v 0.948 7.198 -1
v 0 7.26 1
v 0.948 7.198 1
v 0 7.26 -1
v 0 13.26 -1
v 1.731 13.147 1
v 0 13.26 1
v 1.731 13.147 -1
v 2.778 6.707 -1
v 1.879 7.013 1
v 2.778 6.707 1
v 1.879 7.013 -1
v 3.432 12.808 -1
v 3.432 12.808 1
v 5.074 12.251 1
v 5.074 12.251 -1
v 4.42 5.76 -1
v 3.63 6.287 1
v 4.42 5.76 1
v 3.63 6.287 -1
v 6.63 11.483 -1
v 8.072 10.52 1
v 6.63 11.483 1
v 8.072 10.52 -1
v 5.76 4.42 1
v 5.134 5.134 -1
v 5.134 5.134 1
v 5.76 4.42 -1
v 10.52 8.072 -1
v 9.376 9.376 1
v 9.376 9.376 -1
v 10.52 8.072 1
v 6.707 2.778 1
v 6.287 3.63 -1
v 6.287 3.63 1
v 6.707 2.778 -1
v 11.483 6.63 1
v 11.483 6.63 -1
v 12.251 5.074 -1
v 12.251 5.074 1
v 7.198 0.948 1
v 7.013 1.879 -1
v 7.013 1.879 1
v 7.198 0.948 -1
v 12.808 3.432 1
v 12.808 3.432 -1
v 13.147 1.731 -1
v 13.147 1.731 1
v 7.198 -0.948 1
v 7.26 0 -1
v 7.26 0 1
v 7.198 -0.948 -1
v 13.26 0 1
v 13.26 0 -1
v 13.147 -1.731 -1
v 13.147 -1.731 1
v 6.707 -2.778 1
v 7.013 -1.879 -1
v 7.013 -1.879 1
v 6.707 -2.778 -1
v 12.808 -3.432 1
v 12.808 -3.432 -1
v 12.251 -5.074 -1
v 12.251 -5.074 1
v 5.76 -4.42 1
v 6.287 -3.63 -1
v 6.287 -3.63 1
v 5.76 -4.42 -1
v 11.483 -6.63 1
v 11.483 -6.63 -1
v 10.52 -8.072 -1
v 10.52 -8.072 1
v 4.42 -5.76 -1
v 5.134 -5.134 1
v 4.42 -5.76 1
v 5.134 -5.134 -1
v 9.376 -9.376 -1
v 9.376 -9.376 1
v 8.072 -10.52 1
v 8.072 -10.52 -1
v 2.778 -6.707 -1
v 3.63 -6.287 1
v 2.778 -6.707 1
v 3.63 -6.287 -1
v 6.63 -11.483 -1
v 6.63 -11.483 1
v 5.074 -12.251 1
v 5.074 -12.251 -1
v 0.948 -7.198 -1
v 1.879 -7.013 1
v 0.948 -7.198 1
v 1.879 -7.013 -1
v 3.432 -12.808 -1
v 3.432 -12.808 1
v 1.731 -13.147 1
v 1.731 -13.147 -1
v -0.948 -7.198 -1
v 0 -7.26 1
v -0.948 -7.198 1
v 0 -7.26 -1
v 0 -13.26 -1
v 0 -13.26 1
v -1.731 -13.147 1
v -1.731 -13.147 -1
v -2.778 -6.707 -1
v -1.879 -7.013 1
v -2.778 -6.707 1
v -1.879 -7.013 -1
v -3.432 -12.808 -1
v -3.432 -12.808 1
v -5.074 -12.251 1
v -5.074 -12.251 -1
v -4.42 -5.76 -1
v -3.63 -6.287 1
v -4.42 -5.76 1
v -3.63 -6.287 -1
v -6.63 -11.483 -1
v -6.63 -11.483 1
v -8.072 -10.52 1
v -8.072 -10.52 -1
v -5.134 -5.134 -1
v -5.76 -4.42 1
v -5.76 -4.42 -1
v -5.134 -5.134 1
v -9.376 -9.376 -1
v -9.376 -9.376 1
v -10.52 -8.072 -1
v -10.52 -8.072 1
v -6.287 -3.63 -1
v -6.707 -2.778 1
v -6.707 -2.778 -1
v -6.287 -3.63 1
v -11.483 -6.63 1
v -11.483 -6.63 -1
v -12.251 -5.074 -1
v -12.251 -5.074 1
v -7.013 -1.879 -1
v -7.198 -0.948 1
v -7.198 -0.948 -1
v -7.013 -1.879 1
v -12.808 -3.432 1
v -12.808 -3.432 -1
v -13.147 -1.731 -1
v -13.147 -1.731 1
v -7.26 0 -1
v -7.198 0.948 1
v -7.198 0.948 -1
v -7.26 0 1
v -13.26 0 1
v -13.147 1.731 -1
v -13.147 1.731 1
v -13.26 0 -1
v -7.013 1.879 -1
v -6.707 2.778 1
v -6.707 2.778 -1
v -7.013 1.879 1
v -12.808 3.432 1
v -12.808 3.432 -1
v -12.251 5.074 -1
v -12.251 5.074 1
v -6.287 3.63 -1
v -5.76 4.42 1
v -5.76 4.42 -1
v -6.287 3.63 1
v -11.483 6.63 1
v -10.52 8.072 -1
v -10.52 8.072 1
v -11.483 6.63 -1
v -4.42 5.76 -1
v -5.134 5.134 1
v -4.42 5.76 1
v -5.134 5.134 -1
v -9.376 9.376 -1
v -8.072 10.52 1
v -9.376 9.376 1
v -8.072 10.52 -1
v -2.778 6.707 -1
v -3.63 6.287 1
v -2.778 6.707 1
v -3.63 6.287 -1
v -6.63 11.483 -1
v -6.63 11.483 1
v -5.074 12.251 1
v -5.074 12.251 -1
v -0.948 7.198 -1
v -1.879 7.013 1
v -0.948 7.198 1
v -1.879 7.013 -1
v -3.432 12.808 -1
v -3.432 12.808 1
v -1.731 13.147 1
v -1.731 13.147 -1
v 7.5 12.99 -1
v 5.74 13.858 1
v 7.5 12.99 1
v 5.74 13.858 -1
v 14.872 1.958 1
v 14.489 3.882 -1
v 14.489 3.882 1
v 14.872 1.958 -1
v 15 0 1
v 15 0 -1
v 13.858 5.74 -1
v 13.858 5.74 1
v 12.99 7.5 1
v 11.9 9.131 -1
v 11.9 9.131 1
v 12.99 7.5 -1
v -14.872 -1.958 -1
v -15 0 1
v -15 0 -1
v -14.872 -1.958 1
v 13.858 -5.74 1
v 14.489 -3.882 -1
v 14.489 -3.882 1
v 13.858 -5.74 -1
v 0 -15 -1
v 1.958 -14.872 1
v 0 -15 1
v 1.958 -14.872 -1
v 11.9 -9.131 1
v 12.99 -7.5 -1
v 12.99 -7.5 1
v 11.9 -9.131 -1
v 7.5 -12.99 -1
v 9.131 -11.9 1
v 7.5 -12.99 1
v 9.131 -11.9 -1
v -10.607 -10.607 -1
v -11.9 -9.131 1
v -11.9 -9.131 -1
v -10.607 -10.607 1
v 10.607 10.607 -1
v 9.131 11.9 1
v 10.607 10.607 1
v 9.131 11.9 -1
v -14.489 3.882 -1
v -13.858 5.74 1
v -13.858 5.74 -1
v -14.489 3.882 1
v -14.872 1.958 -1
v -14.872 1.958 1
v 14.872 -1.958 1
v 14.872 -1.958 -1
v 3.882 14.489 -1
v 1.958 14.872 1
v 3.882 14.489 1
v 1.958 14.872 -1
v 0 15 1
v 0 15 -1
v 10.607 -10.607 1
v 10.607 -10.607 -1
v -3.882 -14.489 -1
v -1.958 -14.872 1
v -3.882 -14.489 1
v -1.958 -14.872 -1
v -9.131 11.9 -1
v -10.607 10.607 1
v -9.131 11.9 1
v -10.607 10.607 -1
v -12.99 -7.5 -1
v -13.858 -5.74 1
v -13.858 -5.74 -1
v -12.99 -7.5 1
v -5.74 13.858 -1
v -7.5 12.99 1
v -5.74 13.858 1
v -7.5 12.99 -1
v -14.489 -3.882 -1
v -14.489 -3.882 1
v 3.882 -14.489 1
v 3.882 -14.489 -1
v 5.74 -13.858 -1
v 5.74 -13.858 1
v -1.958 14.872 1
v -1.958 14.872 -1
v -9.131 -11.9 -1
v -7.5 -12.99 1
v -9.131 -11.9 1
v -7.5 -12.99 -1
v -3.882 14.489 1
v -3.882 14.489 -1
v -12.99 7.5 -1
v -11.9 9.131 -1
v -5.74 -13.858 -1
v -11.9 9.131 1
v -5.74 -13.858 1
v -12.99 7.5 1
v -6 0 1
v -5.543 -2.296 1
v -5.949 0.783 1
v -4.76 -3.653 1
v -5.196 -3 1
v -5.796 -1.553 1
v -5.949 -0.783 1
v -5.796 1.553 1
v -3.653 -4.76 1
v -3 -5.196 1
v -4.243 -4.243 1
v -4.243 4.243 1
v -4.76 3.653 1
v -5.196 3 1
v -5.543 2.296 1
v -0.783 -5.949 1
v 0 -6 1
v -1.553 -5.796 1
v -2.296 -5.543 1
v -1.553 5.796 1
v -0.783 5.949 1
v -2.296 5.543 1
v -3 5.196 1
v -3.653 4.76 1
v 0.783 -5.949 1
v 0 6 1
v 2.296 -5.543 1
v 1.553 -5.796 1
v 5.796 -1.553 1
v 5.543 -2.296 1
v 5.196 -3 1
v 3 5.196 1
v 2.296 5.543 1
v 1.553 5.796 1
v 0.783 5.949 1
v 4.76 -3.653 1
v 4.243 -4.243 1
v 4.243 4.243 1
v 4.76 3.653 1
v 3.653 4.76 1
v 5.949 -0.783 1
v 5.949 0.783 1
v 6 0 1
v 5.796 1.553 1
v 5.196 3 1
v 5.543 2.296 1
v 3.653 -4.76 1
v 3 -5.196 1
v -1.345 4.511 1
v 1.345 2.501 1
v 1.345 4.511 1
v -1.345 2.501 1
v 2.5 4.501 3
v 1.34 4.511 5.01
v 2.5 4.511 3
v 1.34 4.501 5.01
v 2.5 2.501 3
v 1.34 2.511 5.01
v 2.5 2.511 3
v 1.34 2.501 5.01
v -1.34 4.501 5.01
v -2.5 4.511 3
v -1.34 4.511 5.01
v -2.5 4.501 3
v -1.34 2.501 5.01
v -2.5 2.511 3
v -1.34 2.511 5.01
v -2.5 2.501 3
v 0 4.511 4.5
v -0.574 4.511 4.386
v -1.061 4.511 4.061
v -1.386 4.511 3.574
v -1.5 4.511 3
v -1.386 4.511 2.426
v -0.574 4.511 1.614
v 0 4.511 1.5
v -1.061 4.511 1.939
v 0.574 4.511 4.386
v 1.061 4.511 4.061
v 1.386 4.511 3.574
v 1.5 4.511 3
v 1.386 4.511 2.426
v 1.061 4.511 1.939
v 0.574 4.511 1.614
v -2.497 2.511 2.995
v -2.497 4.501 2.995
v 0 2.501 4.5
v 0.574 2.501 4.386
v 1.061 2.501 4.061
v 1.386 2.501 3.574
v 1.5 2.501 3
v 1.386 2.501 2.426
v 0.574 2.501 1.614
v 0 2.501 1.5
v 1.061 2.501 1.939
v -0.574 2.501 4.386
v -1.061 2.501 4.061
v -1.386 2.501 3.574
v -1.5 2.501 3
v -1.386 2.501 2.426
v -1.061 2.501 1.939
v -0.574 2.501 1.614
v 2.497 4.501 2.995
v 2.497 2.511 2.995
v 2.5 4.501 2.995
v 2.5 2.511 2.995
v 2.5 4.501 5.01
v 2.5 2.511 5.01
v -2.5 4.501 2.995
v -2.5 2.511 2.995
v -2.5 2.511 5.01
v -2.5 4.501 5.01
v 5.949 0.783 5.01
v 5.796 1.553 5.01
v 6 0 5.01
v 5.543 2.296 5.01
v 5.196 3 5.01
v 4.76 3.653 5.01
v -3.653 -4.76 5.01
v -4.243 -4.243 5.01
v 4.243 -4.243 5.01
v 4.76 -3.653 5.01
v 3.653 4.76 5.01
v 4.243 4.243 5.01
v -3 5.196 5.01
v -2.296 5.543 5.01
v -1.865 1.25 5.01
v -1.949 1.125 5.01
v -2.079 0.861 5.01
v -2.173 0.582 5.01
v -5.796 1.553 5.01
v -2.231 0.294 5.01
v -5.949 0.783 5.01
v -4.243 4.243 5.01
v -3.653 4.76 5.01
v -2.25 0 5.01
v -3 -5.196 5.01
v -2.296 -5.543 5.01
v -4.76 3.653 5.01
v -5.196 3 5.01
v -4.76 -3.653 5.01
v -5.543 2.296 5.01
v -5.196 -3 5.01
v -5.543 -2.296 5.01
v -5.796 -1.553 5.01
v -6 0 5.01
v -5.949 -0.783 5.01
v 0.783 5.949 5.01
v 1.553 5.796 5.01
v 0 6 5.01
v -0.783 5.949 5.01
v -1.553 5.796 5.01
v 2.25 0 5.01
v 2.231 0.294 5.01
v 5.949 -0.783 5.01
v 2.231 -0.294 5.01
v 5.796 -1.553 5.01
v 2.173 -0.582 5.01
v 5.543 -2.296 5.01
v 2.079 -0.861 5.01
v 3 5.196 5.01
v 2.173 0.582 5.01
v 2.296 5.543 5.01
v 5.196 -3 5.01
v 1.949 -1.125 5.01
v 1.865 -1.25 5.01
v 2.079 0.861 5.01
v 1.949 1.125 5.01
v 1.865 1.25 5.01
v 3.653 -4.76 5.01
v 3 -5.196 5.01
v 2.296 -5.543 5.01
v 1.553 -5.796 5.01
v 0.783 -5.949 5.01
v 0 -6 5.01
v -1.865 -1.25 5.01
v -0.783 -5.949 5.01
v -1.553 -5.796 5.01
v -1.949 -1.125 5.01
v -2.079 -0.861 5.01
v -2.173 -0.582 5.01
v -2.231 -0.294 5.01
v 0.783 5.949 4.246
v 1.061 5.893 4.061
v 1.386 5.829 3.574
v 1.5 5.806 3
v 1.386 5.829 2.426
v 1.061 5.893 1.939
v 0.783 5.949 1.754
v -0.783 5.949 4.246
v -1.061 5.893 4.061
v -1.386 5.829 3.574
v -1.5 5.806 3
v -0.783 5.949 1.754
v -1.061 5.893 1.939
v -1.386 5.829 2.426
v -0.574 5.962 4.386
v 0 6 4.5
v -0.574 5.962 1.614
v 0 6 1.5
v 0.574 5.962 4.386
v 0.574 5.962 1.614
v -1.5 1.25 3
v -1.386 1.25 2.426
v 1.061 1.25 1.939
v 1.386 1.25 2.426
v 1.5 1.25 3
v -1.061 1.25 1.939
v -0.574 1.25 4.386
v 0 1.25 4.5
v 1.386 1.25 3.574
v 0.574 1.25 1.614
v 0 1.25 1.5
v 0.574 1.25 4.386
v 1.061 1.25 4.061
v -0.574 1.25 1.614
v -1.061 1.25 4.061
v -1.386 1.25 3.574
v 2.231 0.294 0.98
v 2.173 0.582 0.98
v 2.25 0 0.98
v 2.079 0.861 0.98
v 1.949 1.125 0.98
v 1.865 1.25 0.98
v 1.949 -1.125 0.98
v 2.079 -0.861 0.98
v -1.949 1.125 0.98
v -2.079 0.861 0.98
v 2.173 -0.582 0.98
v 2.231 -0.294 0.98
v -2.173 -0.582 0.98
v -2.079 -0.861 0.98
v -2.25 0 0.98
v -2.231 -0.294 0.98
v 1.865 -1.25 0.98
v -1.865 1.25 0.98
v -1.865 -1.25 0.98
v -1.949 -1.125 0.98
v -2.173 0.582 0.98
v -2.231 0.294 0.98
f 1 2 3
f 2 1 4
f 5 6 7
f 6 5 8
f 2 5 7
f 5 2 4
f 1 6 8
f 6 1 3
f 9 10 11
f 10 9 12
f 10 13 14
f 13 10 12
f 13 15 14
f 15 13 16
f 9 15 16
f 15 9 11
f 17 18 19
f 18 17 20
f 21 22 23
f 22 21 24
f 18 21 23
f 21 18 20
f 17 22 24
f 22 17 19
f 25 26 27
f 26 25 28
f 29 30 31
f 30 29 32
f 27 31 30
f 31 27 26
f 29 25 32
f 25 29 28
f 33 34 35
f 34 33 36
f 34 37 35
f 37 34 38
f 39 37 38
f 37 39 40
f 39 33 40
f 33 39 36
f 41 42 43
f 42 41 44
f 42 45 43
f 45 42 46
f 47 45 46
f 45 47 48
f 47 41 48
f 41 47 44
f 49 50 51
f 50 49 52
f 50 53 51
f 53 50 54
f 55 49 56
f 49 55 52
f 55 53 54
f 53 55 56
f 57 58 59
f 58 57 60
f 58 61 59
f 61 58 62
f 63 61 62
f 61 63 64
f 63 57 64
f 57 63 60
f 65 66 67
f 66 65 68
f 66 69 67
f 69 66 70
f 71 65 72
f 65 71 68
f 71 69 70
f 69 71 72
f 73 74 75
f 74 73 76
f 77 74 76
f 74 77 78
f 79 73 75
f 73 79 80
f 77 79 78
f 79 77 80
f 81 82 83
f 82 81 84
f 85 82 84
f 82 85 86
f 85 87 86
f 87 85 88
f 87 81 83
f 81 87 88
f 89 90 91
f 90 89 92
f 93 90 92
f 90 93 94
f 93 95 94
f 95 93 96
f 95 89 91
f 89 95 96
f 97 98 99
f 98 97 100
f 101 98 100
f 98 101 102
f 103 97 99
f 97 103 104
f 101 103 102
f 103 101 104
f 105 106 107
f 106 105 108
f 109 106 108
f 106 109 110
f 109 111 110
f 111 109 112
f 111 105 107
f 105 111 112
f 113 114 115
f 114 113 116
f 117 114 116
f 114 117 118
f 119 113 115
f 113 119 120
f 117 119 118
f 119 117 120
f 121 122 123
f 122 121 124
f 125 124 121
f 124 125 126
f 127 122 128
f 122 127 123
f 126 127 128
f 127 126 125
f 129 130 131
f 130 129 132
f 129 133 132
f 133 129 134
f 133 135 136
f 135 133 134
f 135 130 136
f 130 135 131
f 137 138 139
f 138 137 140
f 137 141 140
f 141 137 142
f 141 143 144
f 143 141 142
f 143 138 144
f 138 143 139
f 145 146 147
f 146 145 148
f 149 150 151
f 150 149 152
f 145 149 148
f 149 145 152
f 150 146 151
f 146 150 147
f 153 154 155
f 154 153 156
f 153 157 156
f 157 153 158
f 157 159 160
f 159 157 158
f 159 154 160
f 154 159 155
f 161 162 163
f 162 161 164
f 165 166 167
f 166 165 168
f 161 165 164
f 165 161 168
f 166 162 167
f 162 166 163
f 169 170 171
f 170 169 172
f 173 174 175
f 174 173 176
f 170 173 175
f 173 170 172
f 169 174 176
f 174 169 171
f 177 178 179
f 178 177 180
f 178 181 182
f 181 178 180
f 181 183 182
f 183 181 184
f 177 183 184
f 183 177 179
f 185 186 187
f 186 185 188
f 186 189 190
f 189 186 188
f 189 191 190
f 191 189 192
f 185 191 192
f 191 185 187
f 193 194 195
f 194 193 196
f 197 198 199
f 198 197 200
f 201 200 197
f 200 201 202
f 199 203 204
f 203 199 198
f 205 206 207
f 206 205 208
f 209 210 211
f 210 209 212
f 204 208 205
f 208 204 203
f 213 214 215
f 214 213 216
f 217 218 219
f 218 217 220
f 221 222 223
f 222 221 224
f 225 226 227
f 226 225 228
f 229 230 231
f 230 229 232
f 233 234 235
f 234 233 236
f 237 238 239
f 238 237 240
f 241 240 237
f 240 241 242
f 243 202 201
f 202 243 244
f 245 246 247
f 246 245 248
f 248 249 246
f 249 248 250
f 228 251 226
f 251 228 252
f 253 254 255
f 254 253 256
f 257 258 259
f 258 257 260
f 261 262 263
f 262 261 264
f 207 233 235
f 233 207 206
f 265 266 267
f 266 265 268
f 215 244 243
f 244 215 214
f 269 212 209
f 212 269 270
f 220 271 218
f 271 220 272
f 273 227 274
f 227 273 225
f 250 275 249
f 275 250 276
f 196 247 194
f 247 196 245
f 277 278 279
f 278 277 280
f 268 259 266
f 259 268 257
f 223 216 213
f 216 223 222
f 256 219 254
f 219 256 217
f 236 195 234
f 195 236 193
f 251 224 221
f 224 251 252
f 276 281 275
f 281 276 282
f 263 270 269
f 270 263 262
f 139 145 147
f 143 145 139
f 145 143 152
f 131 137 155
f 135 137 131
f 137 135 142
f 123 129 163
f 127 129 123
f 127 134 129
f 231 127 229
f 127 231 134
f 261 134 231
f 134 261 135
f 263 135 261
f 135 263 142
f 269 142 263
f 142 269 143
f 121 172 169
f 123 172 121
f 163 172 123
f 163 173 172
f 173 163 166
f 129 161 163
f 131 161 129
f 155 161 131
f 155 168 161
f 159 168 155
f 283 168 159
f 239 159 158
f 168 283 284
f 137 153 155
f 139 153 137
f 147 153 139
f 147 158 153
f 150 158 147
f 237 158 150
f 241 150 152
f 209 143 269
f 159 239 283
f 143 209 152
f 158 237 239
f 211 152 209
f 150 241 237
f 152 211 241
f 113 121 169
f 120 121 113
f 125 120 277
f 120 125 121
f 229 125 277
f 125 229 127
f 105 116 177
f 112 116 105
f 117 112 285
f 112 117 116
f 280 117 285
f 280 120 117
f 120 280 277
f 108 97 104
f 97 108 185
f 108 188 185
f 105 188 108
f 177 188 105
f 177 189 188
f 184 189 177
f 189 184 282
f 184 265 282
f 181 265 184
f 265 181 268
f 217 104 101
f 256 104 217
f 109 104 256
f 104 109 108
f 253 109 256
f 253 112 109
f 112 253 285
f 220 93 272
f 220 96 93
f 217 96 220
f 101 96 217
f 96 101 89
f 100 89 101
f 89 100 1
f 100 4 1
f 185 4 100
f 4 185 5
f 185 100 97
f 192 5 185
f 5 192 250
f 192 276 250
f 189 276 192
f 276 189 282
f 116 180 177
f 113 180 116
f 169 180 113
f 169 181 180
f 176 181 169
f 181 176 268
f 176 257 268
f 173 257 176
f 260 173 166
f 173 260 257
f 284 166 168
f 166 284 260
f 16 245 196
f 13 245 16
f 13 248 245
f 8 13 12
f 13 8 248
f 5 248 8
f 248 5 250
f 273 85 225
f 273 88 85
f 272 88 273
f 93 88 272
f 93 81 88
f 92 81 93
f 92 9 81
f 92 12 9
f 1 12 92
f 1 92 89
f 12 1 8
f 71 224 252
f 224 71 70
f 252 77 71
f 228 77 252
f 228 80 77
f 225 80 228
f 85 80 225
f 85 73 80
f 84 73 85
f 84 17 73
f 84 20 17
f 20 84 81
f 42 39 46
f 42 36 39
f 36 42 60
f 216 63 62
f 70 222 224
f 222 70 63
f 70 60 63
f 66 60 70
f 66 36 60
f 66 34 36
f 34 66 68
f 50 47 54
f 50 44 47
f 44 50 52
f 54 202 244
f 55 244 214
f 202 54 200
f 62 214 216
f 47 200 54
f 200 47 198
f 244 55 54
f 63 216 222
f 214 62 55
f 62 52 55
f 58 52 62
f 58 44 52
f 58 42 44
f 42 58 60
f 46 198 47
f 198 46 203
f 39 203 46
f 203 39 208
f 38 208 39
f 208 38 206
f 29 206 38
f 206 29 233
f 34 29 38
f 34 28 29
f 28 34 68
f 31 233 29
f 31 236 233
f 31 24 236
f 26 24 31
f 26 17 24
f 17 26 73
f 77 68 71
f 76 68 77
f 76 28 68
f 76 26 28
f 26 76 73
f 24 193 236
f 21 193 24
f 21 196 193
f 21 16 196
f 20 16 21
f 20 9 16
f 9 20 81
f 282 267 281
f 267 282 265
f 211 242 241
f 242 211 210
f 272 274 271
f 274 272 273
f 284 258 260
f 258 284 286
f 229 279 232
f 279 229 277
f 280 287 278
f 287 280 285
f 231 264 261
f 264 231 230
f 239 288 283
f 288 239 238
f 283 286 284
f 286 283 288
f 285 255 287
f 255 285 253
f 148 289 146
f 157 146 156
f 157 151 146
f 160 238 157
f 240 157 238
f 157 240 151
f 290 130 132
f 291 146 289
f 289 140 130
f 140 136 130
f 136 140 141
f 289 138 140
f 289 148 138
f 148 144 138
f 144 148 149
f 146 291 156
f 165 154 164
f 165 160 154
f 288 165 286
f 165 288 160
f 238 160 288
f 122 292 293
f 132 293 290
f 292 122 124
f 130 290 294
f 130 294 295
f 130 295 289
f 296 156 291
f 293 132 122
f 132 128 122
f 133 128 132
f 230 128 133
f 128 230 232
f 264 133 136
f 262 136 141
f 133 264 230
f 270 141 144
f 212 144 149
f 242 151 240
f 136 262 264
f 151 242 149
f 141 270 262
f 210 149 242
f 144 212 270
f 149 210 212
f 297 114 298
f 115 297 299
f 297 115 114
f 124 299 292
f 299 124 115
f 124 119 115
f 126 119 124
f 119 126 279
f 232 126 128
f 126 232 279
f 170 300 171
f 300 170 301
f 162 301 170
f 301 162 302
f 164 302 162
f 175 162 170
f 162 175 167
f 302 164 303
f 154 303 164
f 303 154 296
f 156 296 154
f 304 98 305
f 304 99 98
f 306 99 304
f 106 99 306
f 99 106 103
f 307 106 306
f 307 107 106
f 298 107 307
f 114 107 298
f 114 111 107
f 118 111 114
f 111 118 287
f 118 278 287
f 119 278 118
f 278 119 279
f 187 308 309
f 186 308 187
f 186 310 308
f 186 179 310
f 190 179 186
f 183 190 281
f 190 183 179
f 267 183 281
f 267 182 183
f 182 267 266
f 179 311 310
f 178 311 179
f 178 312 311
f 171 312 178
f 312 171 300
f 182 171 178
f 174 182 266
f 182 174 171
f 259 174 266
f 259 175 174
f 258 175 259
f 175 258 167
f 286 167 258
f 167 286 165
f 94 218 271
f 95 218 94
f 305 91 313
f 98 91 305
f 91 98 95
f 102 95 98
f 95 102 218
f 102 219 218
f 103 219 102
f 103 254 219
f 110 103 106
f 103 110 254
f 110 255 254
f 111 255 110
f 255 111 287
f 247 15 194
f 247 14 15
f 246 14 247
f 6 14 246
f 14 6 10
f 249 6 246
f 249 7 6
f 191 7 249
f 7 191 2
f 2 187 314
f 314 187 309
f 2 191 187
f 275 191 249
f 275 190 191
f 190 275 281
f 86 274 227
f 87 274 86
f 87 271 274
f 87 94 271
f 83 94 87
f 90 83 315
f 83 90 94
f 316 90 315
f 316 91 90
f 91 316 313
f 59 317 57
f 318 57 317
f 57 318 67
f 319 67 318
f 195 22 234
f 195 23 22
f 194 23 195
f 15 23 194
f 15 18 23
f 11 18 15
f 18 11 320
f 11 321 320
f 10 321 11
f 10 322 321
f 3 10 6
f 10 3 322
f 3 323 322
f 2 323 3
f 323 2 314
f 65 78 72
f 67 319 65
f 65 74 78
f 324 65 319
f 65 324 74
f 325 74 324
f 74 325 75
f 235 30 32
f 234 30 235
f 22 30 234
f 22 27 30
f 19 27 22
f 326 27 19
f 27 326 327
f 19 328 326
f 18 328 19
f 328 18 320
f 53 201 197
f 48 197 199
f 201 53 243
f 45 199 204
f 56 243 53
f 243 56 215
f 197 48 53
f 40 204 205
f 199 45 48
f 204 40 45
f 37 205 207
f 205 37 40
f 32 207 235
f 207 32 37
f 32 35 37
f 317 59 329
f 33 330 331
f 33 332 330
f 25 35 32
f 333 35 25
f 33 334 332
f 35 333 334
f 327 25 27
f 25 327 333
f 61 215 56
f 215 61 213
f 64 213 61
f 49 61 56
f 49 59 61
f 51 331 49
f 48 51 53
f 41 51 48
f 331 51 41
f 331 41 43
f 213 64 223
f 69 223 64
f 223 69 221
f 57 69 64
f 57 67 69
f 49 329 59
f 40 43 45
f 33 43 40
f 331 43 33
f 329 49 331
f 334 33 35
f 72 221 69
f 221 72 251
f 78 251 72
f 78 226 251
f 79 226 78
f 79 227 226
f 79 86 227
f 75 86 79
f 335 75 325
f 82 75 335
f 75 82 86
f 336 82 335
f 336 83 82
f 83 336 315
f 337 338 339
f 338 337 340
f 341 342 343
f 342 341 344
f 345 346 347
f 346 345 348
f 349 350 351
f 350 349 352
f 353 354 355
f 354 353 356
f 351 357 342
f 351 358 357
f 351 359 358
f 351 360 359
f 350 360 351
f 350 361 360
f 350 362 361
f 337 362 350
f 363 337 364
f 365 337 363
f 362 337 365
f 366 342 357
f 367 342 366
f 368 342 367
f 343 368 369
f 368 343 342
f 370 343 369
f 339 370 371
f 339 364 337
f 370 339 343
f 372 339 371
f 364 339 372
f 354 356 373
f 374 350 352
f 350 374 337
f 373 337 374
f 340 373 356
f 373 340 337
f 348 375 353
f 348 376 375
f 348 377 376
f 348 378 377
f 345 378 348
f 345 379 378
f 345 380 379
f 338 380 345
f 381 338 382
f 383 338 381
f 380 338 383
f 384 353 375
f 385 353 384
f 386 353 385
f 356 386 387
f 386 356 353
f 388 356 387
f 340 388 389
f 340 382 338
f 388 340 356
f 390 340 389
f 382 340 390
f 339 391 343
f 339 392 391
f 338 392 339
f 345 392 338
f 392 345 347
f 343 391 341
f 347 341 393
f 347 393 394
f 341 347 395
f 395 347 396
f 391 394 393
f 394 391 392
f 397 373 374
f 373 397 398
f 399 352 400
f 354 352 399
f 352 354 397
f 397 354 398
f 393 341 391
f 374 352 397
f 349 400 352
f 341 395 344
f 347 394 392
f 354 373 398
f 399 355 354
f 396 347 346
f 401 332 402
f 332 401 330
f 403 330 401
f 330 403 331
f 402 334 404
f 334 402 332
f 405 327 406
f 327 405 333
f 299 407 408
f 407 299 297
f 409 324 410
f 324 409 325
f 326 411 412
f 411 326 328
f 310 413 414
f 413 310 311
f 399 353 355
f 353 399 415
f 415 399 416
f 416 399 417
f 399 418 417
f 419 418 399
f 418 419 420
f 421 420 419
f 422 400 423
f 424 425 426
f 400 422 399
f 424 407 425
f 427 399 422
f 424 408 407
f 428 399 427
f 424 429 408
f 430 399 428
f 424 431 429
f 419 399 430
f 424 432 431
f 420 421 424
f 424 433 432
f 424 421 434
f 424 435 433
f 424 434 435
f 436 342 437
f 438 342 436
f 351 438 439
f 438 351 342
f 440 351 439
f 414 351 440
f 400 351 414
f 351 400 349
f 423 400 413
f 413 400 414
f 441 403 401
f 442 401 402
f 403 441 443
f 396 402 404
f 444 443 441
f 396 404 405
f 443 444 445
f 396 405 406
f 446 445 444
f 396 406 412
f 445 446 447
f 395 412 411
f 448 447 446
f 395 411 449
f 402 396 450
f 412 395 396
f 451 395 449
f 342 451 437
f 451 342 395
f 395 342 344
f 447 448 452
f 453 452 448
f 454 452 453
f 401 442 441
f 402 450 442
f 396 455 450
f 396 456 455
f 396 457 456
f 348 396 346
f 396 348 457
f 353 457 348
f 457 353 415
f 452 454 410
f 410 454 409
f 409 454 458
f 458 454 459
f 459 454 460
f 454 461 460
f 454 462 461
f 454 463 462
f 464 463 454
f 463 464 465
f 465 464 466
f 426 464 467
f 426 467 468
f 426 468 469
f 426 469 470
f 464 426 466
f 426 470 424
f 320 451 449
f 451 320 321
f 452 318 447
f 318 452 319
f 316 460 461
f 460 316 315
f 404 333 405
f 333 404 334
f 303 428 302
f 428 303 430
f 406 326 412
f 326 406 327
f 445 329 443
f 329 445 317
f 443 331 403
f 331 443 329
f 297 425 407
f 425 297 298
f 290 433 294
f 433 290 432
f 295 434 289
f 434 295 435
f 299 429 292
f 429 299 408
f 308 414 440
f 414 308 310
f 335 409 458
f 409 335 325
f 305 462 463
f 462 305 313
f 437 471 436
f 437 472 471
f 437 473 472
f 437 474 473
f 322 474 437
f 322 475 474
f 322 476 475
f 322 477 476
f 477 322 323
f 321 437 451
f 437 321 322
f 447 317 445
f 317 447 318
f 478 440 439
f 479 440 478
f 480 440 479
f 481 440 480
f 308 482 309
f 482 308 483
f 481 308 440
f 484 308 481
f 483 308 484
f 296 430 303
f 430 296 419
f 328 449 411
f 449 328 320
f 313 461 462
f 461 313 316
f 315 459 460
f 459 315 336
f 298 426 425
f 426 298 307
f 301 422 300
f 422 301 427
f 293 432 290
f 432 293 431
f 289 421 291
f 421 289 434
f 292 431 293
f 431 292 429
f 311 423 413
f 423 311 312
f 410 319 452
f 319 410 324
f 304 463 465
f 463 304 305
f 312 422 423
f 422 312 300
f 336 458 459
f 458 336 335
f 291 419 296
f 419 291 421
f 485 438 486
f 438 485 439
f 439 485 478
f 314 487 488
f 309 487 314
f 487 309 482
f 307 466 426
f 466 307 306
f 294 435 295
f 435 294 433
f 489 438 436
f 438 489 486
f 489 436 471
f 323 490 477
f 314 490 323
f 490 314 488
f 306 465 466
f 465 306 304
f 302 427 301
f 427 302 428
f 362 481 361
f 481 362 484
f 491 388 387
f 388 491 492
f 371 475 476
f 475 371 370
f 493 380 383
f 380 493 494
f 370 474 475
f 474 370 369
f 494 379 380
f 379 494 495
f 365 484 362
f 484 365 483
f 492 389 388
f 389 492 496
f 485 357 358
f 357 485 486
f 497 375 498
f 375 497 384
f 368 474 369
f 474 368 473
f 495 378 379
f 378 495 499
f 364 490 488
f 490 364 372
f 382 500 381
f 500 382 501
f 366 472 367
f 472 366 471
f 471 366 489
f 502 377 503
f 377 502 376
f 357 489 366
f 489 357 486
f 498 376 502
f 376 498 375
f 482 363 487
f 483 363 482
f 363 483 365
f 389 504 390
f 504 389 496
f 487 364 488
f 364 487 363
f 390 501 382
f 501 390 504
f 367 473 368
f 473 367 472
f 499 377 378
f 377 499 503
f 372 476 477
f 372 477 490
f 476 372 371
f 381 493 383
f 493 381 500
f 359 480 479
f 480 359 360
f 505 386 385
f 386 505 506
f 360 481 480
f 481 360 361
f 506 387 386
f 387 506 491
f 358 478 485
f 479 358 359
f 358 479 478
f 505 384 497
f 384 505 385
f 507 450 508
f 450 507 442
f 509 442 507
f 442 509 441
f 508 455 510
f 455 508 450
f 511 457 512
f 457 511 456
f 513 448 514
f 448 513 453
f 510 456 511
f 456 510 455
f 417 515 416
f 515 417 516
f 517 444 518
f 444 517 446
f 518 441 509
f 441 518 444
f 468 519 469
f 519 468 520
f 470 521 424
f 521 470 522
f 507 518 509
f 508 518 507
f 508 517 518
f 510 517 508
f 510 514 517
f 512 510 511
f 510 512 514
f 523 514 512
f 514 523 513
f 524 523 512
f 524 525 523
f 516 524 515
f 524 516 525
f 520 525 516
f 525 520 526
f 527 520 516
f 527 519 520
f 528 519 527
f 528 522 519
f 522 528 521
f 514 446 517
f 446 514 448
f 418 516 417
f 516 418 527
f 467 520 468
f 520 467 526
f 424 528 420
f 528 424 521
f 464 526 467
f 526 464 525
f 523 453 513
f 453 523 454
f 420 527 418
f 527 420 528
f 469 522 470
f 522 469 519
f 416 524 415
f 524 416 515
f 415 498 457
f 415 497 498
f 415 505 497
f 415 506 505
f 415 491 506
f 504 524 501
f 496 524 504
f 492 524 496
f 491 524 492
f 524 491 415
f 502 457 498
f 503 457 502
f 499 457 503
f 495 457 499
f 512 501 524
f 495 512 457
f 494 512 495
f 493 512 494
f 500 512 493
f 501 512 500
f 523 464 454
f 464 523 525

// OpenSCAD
//customizable optical encoder
// James Wickware - 7/18/2016

// preview[view:north east, tilt:top diagonal]

/* [Encoder] */
// the outer diameter of the optical encoder in millimeters.
outer_diameter = 30; //[0:150] 

// the height of the encoder wheel in millimeters.
wheel_height = 2; //[0.1:0.1:20]

// the length of the slits in millimeters.
slit_length = 6; //[0:0.5:75]

// the number of slits in the encoder.
slit_count = 24; // [2:100]

// the ratio of the slit opening to the solid section between the slits. (0.5 is equal )
slit_ratio = 0.5; // [0.05:0.05:0.95]

// the distance between the outer diameter and the opening of the slits in millimeters.
rim_width =  1.75; // [0:0.25:25]



/* [Hub] */
// the diameter of the inner hub in millimeters.
hub_diameter = 12; // [0:0.25:25]

// the length that the hub shaft extends from the encoder wheel in millimeters.
hub_height = 4; // [0:0.5:50]


/* [Shaft] */
// the type of shaft 0 for circular shaft, 1 d shaft (circular with 1 flat, 2 double d shaft (circular with 2 flats), 3 for square shaft 4 for hex shaft, 5 for octagonal shaft.
shaft_type =2; //[0:Cylindrical Shaft, 1:D Type Shaft,2:Double D type Shaft,3:Square Shaft, 4:Hexagonal Shaft, 5:Octagonal Shaft]

// the diameter of the hole for the shaft in millimeters.
shaft_diameter = 4.5; //[0:0.1:20]

// Choose whether or not you want the shaft to go all the way through the encoder wheel.
shaft_goes_through_encoder =0 ; // [0:False,1:True]

// the depth of the flat from the outside edge of the shaft in millimeters (for d and double d shaft type only).
shaft_flat_depth = 1; // [0:0.1:10]


/* [Set Screw] */
// choose whether to include a hole for a set screw
set_screw = 1; // [0:False,1:True]

// the size of the set screw in millimeters
set_screw_diameter = 3; // [0:0.5:10]

// choose whether to include a slot for a set screw nut (automatically disabled when there is not enough room for it).
set_screw_nut = 1; // [0:False,1:True]

// the set screw nut diameter in millimeters. (for hex nuts, the distance from one corner to the opposite corner)
set_screw_nut_diameter = 5; // [1:0.25:14]
 
//  the set screw nut thickness in millimeters
set_screw_nut_thickness = 2; //[0.25:0.25:10]

/* [Hidden] */

// the outer radius
outer_radius = max(outer_diameter/2, hub_diameter/2);

// the hub radius.
hub_radius = hub_diameter/2;
shaft_radius = shaft_diameter/2;

// the depth of the hole for the shaft in millimeters.
shaft_depth = hub_height + (wheel_height*shaft_goes_through_encoder);  

// calcuate whether or not the set screw and or nut can safely be included.
min_set_screw_nut_diameter = set_screw_diameter + 0.5;
max_set_screw_nut_diameter = (hub_diameter - shaft_diameter) * 0.6; // allow 60% of distance between shaft and hub
max_set_screw_nut_thickness = (hub_radius - shaft_radius) * 0.6; // allow 60% of distance between shaft and hub

can_have_screw =  (hub_height-0.99 > set_screw_diameter)  ? 1:0 ;
  
can_have_nut =  ((set_screw_diameter > 0) ? 1: 0)
                 * ((set_screw_diameter < set_screw_nut_diameter) ? 1:0)
                * ((set_screw_nut_thickness < max_set_screw_nut_thickness) ? 1:0) 
                * set_screw_nut
                * can_have_screw;
echo(can_have_screw);
echo(can_have_nut);

set_screw_nut_offset = (((shaft_type == 0) ? 1:0) * .95)
                       +(((shaft_type == 1) ? 1:0) * .85)
                       +(((shaft_type == 2) ? 1:0) * .85)
                       +(((shaft_type == 3) ? 1:0) * .925)
                       +(((shaft_type == 4) ? 1:0) * .925)
                       +(((shaft_type == 5) ? 1:0) * .925)
                       +(((shaft_type == 6) ? 1:0) * .925)
                       +(((shaft_type == 7) ? 1:0) * .925)
                       +(((shaft_type == 8) ? 1:0) * .925)
                       ;
                       
                       
                       echo(set_screw_nut_offset);
// fudge factor to prevent coplanar boolean issues
fudge = 0.01;
difference(){
    union(){
 
        // Setup variables for wheel
        outer_rad = max((outer_radius - rim_width ) + fudge, hub_radius + fudge) ;
        inner_rad = max((outer_radius - rim_width - max(slit_length,0)) + fudge , hub_radius + fudge );
        step = 360/slit_count;
        half_step = step/2;
        qtr_step =  half_step / 2 ;       
        
        echo("step");
        echo (step);
        ratio_angle = (slit_ratio-0.5) * half_step;
        // don't create slits if some touch-hard has made the hub too big
        if(outer_rad > inner_rad){ 
            // create the wheel
            difference(){
                cylinder(r = outer_diameter/2, h= wheel_height, $fn = slit_count * 2, center = true);
             
                if( slit_count%2 == 0){

                    // create slits
                    for (i = [0 :  step : 360 - fudge  ])
                    {
                        points = [
                        [ sin(i +ratio_angle)*outer_rad, cos(i+ratio_angle)*outer_rad , -wheel_height ],  
                        [ sin(i +ratio_angle)*inner_rad, cos(i+ratio_angle)*inner_rad,  -wheel_height ], 
                        [ sin(i+half_step - ratio_angle)*inner_rad , cos(i+half_step- ratio_angle)*inner_rad, -wheel_height ],  
                        [ sin(i+half_step - ratio_angle)*outer_rad,  cos(i+half_step- ratio_angle)*outer_rad, -wheel_height ],
                        [ sin(i+ratio_angle)*outer_rad, cos(i+ratio_angle)*outer_rad,  wheel_height ],
                        [ sin(i+ratio_angle)*inner_rad, cos(i+ratio_angle)*inner_rad,  wheel_height ],
                        [ sin(i+half_step - ratio_angle)*inner_rad , cos(i+half_step- ratio_angle)*inner_rad,  wheel_height ],
                        [ sin(i+half_step - ratio_angle)*outer_rad,  cos(i+half_step- ratio_angle)*outer_rad,  wheel_height ]
                        ];

                        faces = [
                        [0,1,2,3],   
                        [4,5,1,0],   
                        [7,6,5,4],   
                        [5,6,2,1],   
                        [6,7,3,2],  
                        [7,4,0,3]];  

                        rotate(0,0,i)
                        polyhedron( points, faces ) ; 
                    } 
                }
                else{   
                    for (i = [0 :  step : 360  - fudge])
                    {
                        points = [
                        [ sin(i-qtr_step)*outer_rad, cos(i-qtr_step)*outer_rad , -wheel_height ],  
                        [ sin(i-qtr_step)*inner_rad, cos(i-qtr_step)*inner_rad,  -wheel_height ], 
                        [ sin(i+qtr_step)*inner_rad , cos(i+qtr_step)*inner_rad, -wheel_height ],  
                        [ sin(i+qtr_step)*outer_rad,  cos(i+qtr_step)*outer_rad, -wheel_height ],
                        [ sin(i-qtr_step)*outer_rad, cos(i-qtr_step)*outer_rad,  wheel_height ],
                        [ sin(i-qtr_step)*inner_rad, cos(i-qtr_step)*inner_rad,  wheel_height ],
                        [ sin(i+qtr_step)*inner_rad , cos(i+qtr_step)*inner_rad,  wheel_height ],
                        [ sin(i+qtr_step)*outer_rad,  cos(i+qtr_step)*outer_rad,  wheel_height ]
                        ];

                        faces = [
                        [0,1,2,3],   
                        [4,5,1,0],   
                        [7,6,5,4],   
                        [5,6,2,1],   
                        [6,7,3,2],  
                        [7,4,0,3]];  

                        rotate(0,0,i)
                        polyhedron( points, faces ) ;
                    }
                }
                
            }
        }
        
        // create hub
        if(hub_height > 0){
            if(set_screw == 1 && set_screw_diameter > 0 && can_have_screw == 1){
                difference(){
                  translate([0,0, ((hub_height/2) + (wheel_height /2))] )       
                  cylinder(r= min(hub_diameter/2, (outer_diameter/2)-fudge ), h = hub_height +(fudge*2), $fn = slit_count *2, center = true);
                    
                    // set screw hole
                    translate([0,0, ((hub_height/2) + (wheel_height/2 ))] ) 
                    rotate([-90,0,0]) 
                     cylinder(r=set_screw_diameter/2, h=hub_diameter, $fn=16);
                    if(can_have_nut == 1){
                    // set screw nut
                   translate([0,(hub_radius - ((hub_radius-shaft_radius)/2))*set_screw_nut_offset, ((hub_height/2) + (wheel_height/2 ))] )     
                    rotate([90,00,00])
                    cylinder(r=max(min_set_screw_nut_diameter/2,set_screw_nut_diameter/2), h=max(set_screw_nut_thickness,0.25) +fudge, $fn=6, center = true);
                    
                   translate([0,(hub_radius - ((hub_radius-shaft_radius)/2))*set_screw_nut_offset, ((hub_height/2) + (wheel_height/2 )) + 
                    (((hub_height/2) + (wheel_height/2 )+set_screw_nut_diameter /2 )-fudge) /2] )  
                    cube([max(min_set_screw_nut_diameter ,set_screw_nut_diameter ) ,max(set_screw_nut_thickness,0.25)-fudge,(((hub_height/2) + (wheel_height/2 )+max(min_set_screw_nut_diameter ,set_screw_nut_diameter ) /2 ))  ],center=true);
                    }
                    
                    }
            }
            else {
                translate([0,0, ((hub_height/2) + (wheel_height /2))] )       
                cylinder(r= min(hub_diameter/2, (outer_diameter/2)-fudge ), h = hub_height +(fudge*2), $fn = slit_count *2, center = true);        
            }
        }
    };
 
 // shaft
    // cylindrical shaft
    if(shaft_type == 0){
        translate([0,0, ((shaft_depth/2) + (wheel_height /2) + (hub_height ))]) // move shaft to the top of the hub
        translate([0,0,-min(shaft_depth, hub_height+wheel_height)]) // insert the shaft until it hits bottom >:)

        cylinder(r= shaft_diameter/2, h=shaft_depth + (fudge*4) , $fn = max(slit_count*2, 6) ,center = true);
    }
    
    // d type shaft
    if(shaft_type == 1)
    {
        translate([0,0, ((shaft_depth/2) + (wheel_height /2) + (hub_height ))]) // move shaft to the top of the hub
        translate([0,0,-min(shaft_depth, hub_height+wheel_height)]) // insert the shaft until it hits bottom >:)
    
        difference(){
            cylinder(r= shaft_diameter/2, h=shaft_depth + (fudge*4) , $fn = max(slit_count*2, 6) ,center = true);    
       
            translate([0, max( shaft_diameter - shaft_flat_depth , shaft_diameter/2),0  ]) 
            cube ( [shaft_diameter*2,shaft_diameter, shaft_depth*2 ], center = true)  ; 
       }  
    }

    // double d type shaft -- double D = big breasts -- 
    if (shaft_type == 2)
    {
        translate([0,0, ((shaft_depth/2) + (wheel_height /2) + (hub_height ))]) // move shaft to the top of the hub
        translate([0,0,-min(shaft_depth, hub_height+wheel_height)]) // insert the shaft until it hits bottom >:)
    
        difference(){
            cylinder(r= shaft_diameter/2, h=shaft_depth + (fudge*4) , $fn = max(slit_count*2, 6) ,center = true);    
         
            translate([0, max( shaft_diameter - shaft_flat_depth , shaft_diameter/2),0  ]) 
            cube ( [shaft_diameter*2,shaft_diameter, shaft_depth*2 ], center = true); 
         
            translate([0, min( -( shaft_diameter - shaft_flat_depth), -(shaft_diameter/2)),0  ]) 
            cube ( [shaft_diameter*2,shaft_diameter, shaft_depth*2 ], center = true); 
        }  
    }
    
    // square shaft
    if (shaft_type == 3)
    {
        translate([0,0, ((shaft_depth/2) + (wheel_height /2) + (hub_height ))]) // move shaft to the top of the hub
        translate([0,0,-min(shaft_depth, hub_height+wheel_height)]) // insert the shaft until it hits bottom >:)
        rotate([0,0,45]) 
        cylinder(r= shaft_diameter/2, h=shaft_depth + (fudge*4) , $fn = 4 ,center = true);
    }
    
    // hex shaft
    if (shaft_type == 4)
    {
        translate([0,0, ((shaft_depth/2) + (wheel_height /2) + (hub_height ))]) // move shaft to the top of the hub
        translate([0,0,-min(shaft_depth, hub_height+wheel_height)]) // insert the shaft until it hits bottom >:)
    
        cylinder(r= shaft_diameter/2, h=shaft_depth + (fudge*4) , $fn =   6  ,center = true);
    }
    
    // octopus shaft
    if (shaft_type == 5)
    {
        translate([0,0, ((shaft_depth/2) + (wheel_height /2) + (hub_height ))]) // move shaft to the top of the hub
        translate([0,0,-min(shaft_depth, hub_height+wheel_height)]) // insert the shaft until it hits bottom >:)
      rotate([0,0,22.5]) 
        cylinder(r= shaft_diameter/2, h=shaft_depth + (fudge*4) , $fn =   8  ,center = true);
    }
}
